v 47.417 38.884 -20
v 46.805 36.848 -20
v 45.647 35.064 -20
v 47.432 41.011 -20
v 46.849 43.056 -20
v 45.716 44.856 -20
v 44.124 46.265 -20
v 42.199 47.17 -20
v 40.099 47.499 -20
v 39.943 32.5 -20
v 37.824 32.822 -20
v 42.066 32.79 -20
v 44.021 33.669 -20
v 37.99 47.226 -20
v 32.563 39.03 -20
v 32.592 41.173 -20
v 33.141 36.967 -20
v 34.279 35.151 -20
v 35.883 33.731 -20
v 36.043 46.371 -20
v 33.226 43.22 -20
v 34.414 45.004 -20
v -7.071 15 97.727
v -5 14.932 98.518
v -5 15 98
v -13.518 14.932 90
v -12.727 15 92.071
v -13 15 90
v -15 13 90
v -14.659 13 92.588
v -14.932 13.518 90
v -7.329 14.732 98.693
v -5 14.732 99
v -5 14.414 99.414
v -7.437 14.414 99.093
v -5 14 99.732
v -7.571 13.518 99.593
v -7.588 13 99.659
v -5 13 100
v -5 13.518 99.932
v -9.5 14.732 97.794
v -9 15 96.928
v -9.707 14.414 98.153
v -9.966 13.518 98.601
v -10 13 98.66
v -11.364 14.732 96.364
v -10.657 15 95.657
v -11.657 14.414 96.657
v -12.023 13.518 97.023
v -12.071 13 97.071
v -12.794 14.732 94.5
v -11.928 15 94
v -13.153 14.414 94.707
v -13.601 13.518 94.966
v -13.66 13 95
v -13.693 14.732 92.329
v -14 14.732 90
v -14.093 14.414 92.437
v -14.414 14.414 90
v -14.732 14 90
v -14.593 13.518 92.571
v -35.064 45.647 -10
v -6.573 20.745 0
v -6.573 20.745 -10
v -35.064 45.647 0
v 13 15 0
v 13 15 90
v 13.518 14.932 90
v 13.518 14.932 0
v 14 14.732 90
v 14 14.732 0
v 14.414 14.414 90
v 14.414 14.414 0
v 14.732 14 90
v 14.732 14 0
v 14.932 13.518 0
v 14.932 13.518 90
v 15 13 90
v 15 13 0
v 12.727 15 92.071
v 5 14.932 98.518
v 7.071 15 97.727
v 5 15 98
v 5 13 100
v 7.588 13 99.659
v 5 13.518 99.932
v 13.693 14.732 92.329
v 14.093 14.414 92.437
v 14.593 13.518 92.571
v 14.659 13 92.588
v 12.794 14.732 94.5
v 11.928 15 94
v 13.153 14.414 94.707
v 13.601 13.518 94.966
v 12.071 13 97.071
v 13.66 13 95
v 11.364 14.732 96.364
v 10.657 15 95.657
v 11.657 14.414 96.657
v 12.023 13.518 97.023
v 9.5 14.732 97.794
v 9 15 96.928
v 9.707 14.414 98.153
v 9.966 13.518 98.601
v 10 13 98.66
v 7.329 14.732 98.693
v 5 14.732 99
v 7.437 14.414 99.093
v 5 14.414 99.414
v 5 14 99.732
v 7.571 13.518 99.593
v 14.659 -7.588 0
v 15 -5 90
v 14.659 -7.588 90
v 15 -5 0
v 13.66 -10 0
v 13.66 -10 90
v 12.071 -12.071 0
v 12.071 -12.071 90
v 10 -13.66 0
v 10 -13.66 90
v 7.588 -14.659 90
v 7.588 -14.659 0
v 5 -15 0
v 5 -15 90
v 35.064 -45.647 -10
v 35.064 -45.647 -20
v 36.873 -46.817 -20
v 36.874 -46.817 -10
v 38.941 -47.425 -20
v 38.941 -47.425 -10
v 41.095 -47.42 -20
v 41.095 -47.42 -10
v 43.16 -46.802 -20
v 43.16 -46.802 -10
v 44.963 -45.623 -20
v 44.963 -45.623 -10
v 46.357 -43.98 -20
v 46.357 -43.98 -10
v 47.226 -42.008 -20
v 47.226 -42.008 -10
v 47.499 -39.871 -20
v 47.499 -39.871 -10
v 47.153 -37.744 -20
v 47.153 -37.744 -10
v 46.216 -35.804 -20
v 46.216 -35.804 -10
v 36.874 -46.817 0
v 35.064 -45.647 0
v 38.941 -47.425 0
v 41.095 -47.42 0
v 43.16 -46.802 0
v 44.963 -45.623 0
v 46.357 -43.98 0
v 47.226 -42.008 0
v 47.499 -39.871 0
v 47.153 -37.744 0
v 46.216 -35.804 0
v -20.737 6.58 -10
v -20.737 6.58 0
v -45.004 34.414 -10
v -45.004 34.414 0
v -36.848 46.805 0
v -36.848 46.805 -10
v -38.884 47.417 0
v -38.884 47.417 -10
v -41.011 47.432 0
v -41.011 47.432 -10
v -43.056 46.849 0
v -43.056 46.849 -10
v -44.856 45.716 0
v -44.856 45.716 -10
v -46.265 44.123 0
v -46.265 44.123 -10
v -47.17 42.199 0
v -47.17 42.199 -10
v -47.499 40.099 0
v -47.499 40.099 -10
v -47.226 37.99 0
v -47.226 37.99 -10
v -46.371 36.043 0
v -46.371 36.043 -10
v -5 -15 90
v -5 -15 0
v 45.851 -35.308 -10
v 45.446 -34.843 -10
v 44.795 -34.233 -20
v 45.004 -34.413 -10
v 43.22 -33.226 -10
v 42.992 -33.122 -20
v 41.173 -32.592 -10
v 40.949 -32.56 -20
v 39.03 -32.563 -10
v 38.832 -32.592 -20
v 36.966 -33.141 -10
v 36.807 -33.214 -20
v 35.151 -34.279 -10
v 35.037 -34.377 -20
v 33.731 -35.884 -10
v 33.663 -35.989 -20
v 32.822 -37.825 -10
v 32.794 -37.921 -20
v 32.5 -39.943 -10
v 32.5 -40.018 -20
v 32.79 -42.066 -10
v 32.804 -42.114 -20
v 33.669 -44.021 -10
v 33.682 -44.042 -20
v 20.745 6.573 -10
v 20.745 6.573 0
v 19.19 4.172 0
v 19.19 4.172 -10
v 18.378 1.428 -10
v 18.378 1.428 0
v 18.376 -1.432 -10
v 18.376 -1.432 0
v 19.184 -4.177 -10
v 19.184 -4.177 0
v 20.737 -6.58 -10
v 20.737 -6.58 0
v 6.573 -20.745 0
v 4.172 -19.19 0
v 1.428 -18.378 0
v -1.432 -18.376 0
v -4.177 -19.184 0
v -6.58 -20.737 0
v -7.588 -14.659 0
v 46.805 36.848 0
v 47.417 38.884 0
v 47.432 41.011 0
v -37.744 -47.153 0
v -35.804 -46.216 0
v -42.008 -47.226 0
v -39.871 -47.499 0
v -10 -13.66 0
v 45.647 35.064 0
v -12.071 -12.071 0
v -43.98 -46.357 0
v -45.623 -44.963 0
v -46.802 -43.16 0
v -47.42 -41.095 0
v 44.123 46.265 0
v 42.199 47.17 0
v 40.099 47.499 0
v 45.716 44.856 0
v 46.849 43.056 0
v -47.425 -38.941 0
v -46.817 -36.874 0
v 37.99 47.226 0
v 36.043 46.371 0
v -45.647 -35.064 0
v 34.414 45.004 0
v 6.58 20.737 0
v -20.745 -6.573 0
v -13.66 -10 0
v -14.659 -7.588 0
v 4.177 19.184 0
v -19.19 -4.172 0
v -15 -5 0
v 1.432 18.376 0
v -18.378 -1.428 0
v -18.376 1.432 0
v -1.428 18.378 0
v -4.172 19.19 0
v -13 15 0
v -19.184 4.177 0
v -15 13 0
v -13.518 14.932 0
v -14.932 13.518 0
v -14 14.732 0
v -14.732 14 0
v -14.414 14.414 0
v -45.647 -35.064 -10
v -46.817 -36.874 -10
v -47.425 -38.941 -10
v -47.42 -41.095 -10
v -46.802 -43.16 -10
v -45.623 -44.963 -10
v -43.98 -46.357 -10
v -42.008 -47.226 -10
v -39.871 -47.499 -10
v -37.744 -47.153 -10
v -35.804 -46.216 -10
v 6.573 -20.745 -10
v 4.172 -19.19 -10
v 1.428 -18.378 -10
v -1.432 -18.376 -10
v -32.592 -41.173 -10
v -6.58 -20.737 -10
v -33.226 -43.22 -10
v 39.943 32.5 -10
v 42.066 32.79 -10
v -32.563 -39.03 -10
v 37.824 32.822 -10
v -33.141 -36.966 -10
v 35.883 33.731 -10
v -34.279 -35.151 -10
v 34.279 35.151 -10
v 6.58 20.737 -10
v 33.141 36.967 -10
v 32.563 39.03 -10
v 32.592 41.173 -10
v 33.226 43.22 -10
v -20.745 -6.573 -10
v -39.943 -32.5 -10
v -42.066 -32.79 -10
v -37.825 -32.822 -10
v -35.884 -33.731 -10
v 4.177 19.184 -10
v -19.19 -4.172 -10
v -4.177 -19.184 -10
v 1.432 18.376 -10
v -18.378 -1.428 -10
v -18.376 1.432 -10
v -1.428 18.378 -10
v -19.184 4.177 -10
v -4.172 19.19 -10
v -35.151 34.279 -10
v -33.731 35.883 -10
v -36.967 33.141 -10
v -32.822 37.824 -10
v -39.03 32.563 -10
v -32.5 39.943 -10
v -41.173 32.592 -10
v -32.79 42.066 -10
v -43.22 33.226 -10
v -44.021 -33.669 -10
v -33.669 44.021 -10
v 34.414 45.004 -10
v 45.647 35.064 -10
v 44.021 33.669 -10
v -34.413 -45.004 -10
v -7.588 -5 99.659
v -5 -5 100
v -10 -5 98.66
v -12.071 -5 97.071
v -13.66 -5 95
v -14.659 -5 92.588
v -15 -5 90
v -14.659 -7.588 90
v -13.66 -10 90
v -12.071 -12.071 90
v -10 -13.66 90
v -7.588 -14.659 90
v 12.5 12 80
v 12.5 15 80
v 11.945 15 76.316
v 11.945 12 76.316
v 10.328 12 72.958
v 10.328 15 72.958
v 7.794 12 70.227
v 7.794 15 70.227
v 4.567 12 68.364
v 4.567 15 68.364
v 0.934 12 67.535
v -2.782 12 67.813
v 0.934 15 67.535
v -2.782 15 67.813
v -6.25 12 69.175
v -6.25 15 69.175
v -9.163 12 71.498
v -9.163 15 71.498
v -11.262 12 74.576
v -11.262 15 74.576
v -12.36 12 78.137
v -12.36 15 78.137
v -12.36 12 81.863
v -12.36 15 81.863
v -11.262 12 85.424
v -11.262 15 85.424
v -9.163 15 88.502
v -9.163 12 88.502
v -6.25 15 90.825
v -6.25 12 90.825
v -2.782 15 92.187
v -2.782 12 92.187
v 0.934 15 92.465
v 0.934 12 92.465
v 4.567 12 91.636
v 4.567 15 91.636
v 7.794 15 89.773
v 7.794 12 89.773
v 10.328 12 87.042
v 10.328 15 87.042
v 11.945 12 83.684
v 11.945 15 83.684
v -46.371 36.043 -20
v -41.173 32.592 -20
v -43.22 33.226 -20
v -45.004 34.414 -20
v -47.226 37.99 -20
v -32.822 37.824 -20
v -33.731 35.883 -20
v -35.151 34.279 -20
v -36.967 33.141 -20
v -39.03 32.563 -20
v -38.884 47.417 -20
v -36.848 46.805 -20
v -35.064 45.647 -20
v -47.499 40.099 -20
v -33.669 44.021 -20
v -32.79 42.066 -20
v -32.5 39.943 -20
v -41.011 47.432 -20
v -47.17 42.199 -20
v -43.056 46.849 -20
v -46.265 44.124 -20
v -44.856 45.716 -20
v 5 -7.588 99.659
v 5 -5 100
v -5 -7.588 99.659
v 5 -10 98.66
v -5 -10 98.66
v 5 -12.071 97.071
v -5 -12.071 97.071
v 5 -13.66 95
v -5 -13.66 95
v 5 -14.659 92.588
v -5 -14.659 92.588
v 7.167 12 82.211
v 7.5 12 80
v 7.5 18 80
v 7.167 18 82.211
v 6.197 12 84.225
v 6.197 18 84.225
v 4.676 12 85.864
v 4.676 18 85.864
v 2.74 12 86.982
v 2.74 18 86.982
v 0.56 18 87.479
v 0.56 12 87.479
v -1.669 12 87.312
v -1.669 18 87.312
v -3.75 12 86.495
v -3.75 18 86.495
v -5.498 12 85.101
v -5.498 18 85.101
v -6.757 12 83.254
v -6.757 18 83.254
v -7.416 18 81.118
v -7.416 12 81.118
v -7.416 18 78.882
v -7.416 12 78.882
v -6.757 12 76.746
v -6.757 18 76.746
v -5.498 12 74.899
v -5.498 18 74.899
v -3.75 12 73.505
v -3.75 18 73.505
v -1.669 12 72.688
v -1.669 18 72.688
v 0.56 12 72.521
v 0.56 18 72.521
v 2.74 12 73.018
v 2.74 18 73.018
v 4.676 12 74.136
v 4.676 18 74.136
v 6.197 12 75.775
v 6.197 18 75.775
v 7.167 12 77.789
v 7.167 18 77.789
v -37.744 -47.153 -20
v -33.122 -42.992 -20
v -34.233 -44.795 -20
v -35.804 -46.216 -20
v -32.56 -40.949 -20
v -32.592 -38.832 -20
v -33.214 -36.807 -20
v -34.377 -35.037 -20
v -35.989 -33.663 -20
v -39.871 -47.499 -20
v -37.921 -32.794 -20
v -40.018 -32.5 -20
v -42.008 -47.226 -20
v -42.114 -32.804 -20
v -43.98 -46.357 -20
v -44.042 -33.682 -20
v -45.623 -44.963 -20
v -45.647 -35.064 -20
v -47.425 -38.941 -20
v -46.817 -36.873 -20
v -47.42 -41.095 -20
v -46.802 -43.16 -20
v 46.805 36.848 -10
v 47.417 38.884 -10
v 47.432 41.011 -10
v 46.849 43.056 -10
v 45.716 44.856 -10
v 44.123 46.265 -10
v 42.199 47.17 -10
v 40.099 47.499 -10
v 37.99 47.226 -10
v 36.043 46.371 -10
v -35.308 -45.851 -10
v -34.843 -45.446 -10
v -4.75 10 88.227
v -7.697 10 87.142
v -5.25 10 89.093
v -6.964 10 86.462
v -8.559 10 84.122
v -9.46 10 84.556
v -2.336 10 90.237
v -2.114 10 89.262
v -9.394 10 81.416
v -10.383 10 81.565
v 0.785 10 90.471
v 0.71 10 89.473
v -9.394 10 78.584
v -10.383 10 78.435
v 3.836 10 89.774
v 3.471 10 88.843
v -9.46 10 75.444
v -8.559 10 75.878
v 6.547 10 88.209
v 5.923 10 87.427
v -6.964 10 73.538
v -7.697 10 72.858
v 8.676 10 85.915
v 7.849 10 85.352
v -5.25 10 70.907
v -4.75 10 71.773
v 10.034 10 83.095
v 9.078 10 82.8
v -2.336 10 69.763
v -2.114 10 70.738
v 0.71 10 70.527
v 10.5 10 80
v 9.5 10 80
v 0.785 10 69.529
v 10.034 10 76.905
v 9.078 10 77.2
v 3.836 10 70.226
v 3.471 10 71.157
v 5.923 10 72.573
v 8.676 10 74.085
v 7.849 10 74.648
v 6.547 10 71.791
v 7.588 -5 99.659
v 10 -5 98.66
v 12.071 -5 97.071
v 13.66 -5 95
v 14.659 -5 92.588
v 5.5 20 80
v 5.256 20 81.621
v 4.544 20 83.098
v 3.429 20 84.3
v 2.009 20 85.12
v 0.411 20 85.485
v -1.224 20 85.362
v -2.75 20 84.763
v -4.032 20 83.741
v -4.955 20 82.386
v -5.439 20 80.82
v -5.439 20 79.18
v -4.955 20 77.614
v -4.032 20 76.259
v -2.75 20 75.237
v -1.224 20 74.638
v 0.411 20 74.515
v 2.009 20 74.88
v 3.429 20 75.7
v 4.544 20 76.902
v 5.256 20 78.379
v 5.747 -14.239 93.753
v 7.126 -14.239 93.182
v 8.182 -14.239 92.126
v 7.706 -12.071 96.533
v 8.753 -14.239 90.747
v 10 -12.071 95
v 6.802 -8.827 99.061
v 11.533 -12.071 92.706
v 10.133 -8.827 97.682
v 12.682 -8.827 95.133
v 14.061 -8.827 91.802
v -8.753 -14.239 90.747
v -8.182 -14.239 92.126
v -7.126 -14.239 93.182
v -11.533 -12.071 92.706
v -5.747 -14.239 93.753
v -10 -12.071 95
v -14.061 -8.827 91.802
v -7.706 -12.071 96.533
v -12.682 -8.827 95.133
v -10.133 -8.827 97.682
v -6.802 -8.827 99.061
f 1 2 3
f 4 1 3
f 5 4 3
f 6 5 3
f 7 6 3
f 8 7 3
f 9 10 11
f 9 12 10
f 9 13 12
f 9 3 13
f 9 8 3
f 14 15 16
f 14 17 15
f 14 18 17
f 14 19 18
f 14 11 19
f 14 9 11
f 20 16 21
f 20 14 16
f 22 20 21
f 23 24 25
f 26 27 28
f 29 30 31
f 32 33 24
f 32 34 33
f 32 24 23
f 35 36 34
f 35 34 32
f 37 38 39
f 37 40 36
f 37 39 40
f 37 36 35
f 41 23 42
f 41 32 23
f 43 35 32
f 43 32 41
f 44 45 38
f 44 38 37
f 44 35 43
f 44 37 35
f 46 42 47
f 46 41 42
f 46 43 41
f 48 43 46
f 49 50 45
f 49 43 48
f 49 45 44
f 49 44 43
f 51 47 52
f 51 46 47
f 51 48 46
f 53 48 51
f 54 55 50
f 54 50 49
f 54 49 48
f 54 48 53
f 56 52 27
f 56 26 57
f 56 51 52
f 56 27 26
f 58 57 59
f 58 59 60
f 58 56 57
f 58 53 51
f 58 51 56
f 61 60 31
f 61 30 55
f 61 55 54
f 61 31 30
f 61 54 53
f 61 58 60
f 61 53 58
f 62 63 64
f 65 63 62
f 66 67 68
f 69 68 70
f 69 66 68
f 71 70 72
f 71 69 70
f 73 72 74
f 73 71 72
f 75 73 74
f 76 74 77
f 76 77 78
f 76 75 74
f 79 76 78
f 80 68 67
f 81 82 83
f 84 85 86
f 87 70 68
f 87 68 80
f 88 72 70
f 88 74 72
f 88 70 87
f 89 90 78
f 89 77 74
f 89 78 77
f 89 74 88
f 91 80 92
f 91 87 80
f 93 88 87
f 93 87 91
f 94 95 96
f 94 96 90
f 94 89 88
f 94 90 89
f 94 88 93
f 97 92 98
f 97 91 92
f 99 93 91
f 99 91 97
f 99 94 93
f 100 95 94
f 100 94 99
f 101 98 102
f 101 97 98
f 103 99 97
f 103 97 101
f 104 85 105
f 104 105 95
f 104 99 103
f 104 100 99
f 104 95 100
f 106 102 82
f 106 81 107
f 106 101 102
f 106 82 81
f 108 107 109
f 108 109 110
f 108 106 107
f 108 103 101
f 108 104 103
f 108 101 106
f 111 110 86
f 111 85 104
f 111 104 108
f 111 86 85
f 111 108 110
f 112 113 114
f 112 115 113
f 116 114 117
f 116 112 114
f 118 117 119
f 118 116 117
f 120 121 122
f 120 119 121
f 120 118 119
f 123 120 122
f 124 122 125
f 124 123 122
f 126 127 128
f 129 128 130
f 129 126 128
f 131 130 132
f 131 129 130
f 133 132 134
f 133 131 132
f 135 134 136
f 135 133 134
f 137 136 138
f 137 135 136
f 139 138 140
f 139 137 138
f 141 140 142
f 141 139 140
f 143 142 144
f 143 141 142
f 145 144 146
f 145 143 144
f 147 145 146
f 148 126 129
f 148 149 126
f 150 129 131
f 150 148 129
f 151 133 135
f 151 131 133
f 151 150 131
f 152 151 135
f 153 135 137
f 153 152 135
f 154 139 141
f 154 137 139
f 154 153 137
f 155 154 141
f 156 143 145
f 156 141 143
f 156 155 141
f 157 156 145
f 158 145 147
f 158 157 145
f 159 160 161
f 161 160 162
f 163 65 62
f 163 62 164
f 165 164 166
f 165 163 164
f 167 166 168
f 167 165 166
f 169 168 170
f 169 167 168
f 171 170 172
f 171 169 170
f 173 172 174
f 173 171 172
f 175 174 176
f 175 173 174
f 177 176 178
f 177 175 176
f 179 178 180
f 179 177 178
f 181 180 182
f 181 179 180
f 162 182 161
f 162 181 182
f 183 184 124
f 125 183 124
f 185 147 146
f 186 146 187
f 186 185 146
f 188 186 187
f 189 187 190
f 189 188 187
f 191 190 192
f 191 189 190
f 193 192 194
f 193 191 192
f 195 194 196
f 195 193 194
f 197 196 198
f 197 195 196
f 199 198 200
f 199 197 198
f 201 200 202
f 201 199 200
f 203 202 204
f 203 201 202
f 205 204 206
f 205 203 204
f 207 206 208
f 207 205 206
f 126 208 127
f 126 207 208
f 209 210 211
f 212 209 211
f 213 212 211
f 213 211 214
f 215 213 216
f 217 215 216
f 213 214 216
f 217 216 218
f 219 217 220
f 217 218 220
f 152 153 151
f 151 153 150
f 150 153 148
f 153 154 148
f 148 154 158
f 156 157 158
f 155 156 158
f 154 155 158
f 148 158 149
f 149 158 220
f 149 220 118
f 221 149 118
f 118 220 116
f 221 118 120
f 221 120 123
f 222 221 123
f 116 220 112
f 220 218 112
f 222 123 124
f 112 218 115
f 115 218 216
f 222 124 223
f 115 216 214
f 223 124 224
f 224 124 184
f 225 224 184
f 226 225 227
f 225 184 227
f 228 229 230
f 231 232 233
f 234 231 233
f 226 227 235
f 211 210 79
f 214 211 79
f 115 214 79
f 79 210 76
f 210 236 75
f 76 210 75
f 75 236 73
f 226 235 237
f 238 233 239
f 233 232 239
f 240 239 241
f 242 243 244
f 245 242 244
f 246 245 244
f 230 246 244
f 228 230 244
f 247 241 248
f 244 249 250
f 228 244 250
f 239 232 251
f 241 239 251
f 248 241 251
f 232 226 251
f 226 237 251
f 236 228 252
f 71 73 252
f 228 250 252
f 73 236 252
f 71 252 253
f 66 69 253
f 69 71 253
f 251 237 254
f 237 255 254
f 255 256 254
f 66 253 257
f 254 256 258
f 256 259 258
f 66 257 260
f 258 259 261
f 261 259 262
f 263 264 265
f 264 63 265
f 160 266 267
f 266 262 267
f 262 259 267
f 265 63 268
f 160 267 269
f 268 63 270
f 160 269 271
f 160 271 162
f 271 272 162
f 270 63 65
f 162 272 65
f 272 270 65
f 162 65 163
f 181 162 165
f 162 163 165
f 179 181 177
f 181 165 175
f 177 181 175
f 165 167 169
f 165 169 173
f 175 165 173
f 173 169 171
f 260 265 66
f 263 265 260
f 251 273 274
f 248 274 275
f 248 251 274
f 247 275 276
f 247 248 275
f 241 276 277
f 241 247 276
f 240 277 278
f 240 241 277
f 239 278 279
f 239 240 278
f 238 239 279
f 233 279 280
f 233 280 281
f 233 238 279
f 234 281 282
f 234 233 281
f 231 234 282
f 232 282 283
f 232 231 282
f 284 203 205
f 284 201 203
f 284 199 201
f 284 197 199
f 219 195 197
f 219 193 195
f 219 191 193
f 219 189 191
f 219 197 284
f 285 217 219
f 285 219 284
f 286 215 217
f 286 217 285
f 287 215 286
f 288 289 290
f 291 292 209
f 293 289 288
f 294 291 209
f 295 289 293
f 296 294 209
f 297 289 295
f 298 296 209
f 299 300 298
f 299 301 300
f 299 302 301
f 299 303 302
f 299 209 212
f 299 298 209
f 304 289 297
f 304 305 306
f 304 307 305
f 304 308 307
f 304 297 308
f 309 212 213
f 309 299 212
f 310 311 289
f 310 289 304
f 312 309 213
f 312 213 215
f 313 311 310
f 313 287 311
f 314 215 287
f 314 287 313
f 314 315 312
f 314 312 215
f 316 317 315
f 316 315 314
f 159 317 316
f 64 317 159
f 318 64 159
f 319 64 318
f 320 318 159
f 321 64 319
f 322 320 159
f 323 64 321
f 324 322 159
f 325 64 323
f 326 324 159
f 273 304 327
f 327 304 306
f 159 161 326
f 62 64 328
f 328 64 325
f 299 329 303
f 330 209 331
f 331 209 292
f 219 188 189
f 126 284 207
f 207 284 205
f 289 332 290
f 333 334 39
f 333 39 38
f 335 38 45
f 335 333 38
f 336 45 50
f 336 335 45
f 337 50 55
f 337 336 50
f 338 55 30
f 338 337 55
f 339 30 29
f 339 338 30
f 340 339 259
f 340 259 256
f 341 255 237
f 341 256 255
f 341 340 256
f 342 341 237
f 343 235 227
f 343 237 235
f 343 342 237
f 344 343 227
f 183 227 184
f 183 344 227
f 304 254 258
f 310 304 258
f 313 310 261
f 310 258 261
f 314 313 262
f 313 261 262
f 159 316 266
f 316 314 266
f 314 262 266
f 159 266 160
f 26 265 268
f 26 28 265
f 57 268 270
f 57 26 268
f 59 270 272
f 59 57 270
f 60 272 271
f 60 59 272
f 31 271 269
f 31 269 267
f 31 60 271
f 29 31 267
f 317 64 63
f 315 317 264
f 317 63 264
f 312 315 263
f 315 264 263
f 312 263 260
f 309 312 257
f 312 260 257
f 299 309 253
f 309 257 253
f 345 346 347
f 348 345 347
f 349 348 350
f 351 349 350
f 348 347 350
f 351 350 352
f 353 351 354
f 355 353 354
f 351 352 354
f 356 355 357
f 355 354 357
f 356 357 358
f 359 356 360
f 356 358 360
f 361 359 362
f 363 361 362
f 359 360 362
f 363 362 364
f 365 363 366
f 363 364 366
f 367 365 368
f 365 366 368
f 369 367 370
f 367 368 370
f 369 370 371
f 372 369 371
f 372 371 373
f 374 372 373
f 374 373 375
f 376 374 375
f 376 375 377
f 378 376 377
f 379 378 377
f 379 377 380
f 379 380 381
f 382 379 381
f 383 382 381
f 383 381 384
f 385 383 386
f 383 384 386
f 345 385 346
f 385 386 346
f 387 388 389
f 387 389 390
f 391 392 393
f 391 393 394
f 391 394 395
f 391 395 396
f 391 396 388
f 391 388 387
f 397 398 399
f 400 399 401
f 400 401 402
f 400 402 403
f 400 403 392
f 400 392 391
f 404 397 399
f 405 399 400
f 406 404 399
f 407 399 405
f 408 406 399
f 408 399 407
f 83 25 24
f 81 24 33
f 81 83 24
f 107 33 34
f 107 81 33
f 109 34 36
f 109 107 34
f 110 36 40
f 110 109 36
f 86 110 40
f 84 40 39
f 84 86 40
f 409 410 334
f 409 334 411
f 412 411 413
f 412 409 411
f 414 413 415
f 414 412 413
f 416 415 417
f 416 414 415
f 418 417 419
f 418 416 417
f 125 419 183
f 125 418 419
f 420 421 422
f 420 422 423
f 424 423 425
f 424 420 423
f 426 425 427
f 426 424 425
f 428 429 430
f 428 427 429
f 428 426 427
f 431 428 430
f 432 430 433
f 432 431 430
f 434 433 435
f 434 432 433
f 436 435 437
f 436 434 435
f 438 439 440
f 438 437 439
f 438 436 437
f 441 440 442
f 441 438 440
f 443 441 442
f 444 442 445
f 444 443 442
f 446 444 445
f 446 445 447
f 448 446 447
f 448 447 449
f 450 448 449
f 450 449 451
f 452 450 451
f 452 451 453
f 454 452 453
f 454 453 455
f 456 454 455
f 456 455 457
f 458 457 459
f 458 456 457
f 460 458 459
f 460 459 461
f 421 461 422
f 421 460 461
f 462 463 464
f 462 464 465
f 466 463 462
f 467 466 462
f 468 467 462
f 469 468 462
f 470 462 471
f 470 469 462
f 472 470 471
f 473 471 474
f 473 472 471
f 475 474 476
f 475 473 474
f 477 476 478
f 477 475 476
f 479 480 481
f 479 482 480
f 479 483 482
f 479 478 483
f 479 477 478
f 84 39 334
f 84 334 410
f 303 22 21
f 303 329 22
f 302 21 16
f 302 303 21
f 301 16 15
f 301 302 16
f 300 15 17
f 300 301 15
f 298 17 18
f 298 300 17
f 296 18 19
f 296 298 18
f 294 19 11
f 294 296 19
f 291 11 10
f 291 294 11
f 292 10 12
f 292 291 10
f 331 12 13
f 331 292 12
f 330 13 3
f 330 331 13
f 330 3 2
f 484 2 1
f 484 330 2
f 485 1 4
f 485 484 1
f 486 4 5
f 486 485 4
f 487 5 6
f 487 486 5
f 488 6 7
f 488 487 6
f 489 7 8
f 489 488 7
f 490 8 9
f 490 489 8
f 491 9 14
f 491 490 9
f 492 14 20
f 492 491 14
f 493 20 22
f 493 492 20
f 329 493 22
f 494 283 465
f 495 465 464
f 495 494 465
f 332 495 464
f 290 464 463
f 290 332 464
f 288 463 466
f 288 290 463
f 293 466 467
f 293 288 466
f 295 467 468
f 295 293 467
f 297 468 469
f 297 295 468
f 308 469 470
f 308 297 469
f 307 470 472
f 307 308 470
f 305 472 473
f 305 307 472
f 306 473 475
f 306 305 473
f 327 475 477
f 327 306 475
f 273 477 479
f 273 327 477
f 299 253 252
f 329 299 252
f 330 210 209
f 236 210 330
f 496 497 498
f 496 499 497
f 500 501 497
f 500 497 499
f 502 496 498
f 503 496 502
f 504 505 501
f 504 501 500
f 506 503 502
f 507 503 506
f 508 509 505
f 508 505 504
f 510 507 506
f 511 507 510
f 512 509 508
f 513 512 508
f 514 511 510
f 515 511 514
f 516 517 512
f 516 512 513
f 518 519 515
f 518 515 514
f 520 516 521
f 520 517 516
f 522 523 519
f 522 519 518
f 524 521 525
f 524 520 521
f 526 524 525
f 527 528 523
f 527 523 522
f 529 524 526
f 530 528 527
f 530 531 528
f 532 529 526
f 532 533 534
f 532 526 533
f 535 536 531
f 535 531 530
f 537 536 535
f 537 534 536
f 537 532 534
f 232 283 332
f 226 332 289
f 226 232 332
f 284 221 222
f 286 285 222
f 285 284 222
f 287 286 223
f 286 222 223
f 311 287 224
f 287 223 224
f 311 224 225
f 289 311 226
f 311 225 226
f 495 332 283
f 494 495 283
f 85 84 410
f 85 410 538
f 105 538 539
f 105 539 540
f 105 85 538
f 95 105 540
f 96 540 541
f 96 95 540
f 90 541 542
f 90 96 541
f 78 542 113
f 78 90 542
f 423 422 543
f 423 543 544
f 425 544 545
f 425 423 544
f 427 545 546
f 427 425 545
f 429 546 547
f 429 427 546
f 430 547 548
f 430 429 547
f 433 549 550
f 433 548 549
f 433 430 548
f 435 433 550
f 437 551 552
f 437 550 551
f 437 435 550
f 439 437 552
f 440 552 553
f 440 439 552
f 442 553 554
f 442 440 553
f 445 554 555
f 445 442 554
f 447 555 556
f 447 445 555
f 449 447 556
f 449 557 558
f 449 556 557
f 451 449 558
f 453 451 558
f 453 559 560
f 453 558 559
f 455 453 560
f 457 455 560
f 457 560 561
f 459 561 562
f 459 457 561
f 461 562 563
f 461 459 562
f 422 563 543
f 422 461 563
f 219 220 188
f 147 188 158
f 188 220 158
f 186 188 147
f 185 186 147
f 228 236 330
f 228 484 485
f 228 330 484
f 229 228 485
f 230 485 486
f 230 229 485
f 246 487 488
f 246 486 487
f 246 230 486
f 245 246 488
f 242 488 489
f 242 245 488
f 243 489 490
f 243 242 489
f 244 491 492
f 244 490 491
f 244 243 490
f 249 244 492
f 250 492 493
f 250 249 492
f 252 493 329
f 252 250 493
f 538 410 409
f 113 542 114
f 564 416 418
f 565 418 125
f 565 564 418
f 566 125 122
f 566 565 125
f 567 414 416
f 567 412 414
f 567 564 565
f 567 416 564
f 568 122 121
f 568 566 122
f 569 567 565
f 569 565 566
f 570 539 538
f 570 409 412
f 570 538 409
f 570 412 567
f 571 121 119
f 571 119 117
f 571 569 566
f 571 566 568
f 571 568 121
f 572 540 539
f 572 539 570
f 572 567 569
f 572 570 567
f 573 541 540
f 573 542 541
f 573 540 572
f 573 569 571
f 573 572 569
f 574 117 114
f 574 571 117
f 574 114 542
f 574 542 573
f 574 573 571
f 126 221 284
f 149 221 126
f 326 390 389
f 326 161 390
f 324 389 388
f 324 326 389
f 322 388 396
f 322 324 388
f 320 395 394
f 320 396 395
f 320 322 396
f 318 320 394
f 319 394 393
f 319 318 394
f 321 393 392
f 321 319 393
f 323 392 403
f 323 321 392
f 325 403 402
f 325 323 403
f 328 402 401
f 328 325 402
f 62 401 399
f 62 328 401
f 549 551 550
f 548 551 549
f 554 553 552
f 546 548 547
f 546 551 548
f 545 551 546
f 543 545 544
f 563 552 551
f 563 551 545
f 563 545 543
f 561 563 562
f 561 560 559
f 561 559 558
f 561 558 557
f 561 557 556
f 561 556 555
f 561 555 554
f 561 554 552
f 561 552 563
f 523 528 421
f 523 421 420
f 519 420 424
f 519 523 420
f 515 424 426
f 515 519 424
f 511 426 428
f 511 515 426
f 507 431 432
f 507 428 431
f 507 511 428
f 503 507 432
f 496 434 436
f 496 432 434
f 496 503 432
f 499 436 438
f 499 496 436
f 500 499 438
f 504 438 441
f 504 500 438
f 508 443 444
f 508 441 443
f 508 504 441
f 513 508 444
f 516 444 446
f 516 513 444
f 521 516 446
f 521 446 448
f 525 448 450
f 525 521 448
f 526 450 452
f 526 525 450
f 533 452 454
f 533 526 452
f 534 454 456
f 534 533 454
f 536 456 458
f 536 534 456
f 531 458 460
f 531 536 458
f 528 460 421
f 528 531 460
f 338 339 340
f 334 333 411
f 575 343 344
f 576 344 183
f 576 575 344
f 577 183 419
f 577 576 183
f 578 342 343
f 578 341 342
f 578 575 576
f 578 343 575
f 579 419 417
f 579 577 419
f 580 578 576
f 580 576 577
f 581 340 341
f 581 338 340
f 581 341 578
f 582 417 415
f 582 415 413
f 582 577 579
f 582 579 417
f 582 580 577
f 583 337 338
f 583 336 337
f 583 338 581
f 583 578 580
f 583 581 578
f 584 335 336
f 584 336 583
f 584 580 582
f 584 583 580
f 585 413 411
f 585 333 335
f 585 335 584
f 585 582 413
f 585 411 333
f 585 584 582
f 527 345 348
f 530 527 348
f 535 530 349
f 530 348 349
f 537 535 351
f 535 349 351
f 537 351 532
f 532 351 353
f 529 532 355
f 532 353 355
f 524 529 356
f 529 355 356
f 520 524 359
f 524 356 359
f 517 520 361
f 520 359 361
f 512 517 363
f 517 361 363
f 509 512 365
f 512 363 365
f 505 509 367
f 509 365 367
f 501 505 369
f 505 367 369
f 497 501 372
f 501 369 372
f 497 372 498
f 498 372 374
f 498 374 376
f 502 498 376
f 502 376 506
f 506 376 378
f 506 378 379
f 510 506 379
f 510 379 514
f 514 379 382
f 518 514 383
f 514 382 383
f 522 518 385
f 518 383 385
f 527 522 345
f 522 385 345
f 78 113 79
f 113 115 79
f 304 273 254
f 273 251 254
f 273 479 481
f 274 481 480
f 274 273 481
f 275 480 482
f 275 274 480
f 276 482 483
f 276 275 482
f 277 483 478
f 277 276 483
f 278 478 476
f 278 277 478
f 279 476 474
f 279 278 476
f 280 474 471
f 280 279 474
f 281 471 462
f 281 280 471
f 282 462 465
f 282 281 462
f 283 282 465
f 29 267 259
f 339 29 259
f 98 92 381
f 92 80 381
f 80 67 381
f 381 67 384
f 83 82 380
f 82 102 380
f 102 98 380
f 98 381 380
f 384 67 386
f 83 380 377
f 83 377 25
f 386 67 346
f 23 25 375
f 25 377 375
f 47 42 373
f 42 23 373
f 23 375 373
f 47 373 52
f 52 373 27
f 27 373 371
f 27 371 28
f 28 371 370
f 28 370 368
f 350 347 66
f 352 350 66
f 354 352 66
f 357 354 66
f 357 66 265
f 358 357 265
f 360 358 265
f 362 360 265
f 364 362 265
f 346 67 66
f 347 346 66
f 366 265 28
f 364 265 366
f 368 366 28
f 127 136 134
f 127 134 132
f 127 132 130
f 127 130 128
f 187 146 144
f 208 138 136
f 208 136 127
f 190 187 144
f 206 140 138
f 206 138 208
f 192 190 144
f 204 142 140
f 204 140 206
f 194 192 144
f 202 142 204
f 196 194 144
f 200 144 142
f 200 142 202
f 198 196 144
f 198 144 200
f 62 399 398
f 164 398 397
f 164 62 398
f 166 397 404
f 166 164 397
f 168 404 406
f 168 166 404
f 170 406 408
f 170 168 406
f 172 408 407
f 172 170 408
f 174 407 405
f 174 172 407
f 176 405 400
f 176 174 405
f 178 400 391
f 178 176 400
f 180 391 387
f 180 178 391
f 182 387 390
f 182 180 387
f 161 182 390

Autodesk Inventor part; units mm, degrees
ref_plane "YZ Plane" through (0, 0, 0) normal (1, 0, 0) x (0, 1, 0)
ref_plane "XZ Plane" through (0, 0, 0) normal (0, 1, 0) x (-1, 0, 0)
ref_plane "XY Plane" through (0, 0, 0) normal (0, 0, 1) x (1, 0, 0)
sketch "Skizze1" plane through (0, 0, 0) normal (0, 0, 1) x (1, 0, 0)
  line L0 (-15, -15) -> (15, -15)
  line L1 (15, -15) -> (15, 15)
  line L2 (15, 15) -> (-15, 15)
  line L3 (-15, 15) -> (-15, -15)
  line L4 (-15, -15) -> (15, 15) construction
  line L5 (15, -15) -> (-15, 15) construction
  point P0 (0, 0)
  dimension "d0" = 30
  dimension "d1" = 30
extrude "Extrusion1" add sketch "Skizze1" along normal blind 100
sketch "Skizze2" plane through (0, 0, 0) normal (0, 0, -1) x (-1, 0, 0)
  circle A0 centre (40, -40) radius 7.5
  circle A1 centre (-40, -40) radius 7.5
  circle A2 centre (-40, 40) radius 7.5
  circle A3 centre (40, 40) radius 7.5
  line L0 (0, -66.5) -> (0, 66.5) projected
  line L1 (66.5, 0) -> (-66.5, 0) projected
  line L2 (45.6471, -35.0643) -> (15, 0)
  line L3 (15, 15) -> (15, -15) projected
  line L4 (35.8038, -46.2162) -> (0, -15)
  line L5 (15, -15) -> (-15, -15) projected
  line L6 (0, -15) -> (-35.0643, -45.6471)
  line L7 (-15, -15) -> (-15, 15) projected
  line L8 (-15, 0) -> (-46.2162, -35.8038)
  line L9 (-15, 15) -> (15, 15) projected
  line L10 (0, 15) -> (-34.4135, 45.0041)
  line L11 (-15, 0) -> (-45.6471, 35.0643)
  line L12 (0, 15) -> (35.0643, 45.6471)
  line L13 (15, 0) -> (45.0041, 34.4135)
  point P0 (0, 0)
  dimension "d4" = 15
  dimension "d5" = 15
  dimension "d6" = 15
  dimension "d7" = 15
  dimension "d8" = 40
  dimension "d9" = 40
extrude "Extrusion2" add sketch "Skizze2" along normal blind 10 contours A0 L4 | A0 L4 L5 L3 L2 | L3 L5 L0 L1 | L1 L0 L9 L3 | L3 L9 L12 A3 L13 | L5 L7 L1 L0 | L6 A1 L8 L7 L5 | L1 L7 L9 L0 | A3 | A1 L8 | L9 L7 L11 A2 L10 | A2 picked at (40.9311, -37.6896) picked at (-39.2767, -42.7034)
sketch "Skizze3" plane through (0, 0, -10) normal (0, 0, -1) x (-1, 0, 0)
  arc A0 (45.0041, 34.4135) -> (35.0643, 45.6471) centre (40, 40) ccw projected
  circle A1 centre (40, 40) radius 7.5
  arc A2 (35.8038, -46.2162) -> (45.6471, -35.0643) centre (40, -40) ccw projected
  circle A3 centre (40, -40) radius 7.5
  arc A4 (-46.2162, -35.8038) -> (-35.0643, -45.6471) centre (-40, -40) ccw projected
  circle A5 centre (-40, -40) radius 7.5
  arc A6 (-34.4135, 45.0041) -> (-45.6471, 35.0643) centre (-40, 40) ccw projected
  circle A7 centre (-40, 40) radius 7.5
  point P0 (0, 0)
  point P1 (-45.6471, 35.0643)
  point P2 (-34.4135, 45.0041)
  point P3 (45.6471, -35.0643)
  point P4 (-35.0643, -45.6471)
  point P5 (-46.2162, -35.8038)
  point P6 (35.0643, 45.6471)
extrude "Extrusion3" add sketch "Skizze3" along normal blind 10
sketch "Skizze4" plane through (-15, 15, 100) normal (0, 1, 0) x (1, 0, 0)
  circle A0 centre (15, 20) radius 12.5
  line L0 (30, 0) -> (0, 0) projected
  point P0 (15, 100)
  dimension "d14" = 25
  dimension "d15" = 20
extrude "Extrusion4" cut sketch "Skizze4" against normal blind 5
sketch "Skizze5" plane through (0, 10, 80) normal (0, 1, 0) x (1, 0, 0)
  circle A0 centre (0, 0) radius 7.5
  point P0 (0, 80)
  dimension "d18" = 15
extrude "Extrusion5" add sketch "Skizze5" along normal blind 10
fillet "Rundung1" radius 10 2 edges at (15, 0, 100) (-15, 0, 100)
fillet "Rundung2" radius 10 5 edges at (12.0711, -15, 97.0711) (0, -15, 100) (-12.0711, -15, 97.0711) (-15, -15, 45) (15, -15, 45)
chamfer "Fase3" distance 2 angle 45 3 edges at (-7.5, 20, 80) (-7.5, 10, 80) (-12.5, 10, 80)
fillet "Rundung3" radius 2 5 edges at (12.0711, 15, 97.0711) (0, 15, 100) (-12.0711, 15, 97.0711) (-15, 15, 45) (15, 15, 45)
fillet "Rundung4" radius 10 4 edges at (0, -15, -5) (15, 0, -5) (-15, 0, -5) (0, 15, -5)
equation "\"d5\" = d4"
equation "\"d6\" = d4"
equation "\"d7\" = d4"
equation "\"d9\" = d8"
properties part number "Sensor"
